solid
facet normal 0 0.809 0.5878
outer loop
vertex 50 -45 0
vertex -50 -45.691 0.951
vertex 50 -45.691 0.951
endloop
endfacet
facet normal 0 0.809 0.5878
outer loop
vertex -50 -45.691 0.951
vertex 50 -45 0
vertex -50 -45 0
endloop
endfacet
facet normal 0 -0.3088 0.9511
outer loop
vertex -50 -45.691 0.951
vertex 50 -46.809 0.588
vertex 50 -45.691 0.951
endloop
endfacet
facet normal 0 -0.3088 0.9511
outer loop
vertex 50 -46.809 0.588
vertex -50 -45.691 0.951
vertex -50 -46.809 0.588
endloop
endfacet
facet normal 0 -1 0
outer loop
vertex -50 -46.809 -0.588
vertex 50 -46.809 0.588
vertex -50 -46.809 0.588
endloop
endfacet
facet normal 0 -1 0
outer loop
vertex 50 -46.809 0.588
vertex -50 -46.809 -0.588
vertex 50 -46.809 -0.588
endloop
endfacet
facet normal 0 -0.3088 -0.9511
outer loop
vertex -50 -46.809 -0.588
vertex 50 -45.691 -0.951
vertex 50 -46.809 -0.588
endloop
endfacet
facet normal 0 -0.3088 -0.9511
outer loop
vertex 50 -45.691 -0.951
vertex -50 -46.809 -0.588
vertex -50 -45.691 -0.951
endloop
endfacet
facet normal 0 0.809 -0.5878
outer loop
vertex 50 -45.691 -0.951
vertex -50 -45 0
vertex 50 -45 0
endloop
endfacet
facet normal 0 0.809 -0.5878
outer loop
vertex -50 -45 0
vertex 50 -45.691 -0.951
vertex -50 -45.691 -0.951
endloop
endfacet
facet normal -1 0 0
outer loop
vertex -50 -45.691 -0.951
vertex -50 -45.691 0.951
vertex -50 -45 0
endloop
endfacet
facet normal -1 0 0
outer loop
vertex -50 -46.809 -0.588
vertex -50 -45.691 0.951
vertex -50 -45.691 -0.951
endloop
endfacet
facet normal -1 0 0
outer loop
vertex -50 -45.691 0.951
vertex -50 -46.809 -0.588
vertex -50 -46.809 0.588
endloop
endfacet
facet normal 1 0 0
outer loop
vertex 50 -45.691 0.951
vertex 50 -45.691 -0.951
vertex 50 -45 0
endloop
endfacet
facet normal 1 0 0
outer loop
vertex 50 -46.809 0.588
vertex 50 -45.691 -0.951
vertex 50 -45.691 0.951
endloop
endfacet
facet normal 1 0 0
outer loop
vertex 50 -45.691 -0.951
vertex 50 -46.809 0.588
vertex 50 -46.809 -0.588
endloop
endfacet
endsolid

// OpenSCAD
//Overall Tank Dimensions
tank_length = 100;
tank_width = 60;

//Parts Dimensions
hull_width = 0;
hull_height = 0;
tank_height = 30;
track_width = 30;
track_height = 20;
turret_height = 20;


track_length = tank_length * 0.9;




module track( ){
     cube( [ track_length, track_width, track_height  ], true );
     translate( [ track_length / 2,track_width / 2, 0 ] )
        wheel( track_width,track_height );
     translate( [ -track_length / 2, track_width/2, 0 ] )
        wheel(track_width,track_height);
}

module innertrack(){
     cube( [ track_length , track_width + 1, track_height * 0.8 ], true );
     translate( [ track_length / 2, track_width/2 + 2, 0 ] )
        wheel( track_width + 4,track_height * 0.8 );
     translate( [ -track_length / 2 , track_width/2 + 2, 0 ] )
        wheel(track_width + 4,track_height * 0.8 );
}

module wheel( width, diameter ){
    color("purple")
         rotate( [ 90, 0, 0 ] ){
         cylinder( h = width, r = diameter / 2 );
    } 
}

module fulltrack( ){

    difference(){
    track();
    color( "green") innertrack();
    }
    
    translate([ 0,track_width/2,0] ){
        wheel(track_width/2,track_height);
        translate( [ track_length/3 ,0, 0 ] )
        wheel(track_width/2,track_height);
        translate( [-track_length/3,0, 0 ] )
        wheel(track_width/2,track_height);
    }
} 

module tracks(){
    translate( [ 0, -tank_width / 2, 0 ] )
        mirror([0,1,0])
        fulltrack();
    
    translate( [ 0, tank_width / 2, 0 ] )
        fulltrack();  
}

module hull(){
    color("blue")
    difference(){
    translate( [ 0, 0, tank_height / 4 ] )
    cube( [ tank_length,tank_width ,3 * tank_height / 4 ], center = true);
      translate( [ 0, tank_width / 2, 0 ] )
        track();
      translate( [ 0, -tank_width / 2, 0 ] )
        track();
    }
}

module turret(){
    translate( [ 0, 0, tank_height  ] )
      cylinder( h = turret_height, r = tank_width/3, center = true  );
}

module leftedge()
{
    translate( [ 0, tank_width/4 + track_width + 1 , 0 ] )
         rotate( [ 90, 0, 90 ] )
            cylinder(  h = 100, r = 1, center = true );
}

module rightedge()
{
    translate( [ 0,  -tank_width/4 - track_width - 1 , 0 ] )
         rotate( [ 90, 0, 90 ] )
            cylinder(  h = 100, r = 1, center = true );
}



//tracks();
//leftedge();
rightedge();
//hull();
//turret();
